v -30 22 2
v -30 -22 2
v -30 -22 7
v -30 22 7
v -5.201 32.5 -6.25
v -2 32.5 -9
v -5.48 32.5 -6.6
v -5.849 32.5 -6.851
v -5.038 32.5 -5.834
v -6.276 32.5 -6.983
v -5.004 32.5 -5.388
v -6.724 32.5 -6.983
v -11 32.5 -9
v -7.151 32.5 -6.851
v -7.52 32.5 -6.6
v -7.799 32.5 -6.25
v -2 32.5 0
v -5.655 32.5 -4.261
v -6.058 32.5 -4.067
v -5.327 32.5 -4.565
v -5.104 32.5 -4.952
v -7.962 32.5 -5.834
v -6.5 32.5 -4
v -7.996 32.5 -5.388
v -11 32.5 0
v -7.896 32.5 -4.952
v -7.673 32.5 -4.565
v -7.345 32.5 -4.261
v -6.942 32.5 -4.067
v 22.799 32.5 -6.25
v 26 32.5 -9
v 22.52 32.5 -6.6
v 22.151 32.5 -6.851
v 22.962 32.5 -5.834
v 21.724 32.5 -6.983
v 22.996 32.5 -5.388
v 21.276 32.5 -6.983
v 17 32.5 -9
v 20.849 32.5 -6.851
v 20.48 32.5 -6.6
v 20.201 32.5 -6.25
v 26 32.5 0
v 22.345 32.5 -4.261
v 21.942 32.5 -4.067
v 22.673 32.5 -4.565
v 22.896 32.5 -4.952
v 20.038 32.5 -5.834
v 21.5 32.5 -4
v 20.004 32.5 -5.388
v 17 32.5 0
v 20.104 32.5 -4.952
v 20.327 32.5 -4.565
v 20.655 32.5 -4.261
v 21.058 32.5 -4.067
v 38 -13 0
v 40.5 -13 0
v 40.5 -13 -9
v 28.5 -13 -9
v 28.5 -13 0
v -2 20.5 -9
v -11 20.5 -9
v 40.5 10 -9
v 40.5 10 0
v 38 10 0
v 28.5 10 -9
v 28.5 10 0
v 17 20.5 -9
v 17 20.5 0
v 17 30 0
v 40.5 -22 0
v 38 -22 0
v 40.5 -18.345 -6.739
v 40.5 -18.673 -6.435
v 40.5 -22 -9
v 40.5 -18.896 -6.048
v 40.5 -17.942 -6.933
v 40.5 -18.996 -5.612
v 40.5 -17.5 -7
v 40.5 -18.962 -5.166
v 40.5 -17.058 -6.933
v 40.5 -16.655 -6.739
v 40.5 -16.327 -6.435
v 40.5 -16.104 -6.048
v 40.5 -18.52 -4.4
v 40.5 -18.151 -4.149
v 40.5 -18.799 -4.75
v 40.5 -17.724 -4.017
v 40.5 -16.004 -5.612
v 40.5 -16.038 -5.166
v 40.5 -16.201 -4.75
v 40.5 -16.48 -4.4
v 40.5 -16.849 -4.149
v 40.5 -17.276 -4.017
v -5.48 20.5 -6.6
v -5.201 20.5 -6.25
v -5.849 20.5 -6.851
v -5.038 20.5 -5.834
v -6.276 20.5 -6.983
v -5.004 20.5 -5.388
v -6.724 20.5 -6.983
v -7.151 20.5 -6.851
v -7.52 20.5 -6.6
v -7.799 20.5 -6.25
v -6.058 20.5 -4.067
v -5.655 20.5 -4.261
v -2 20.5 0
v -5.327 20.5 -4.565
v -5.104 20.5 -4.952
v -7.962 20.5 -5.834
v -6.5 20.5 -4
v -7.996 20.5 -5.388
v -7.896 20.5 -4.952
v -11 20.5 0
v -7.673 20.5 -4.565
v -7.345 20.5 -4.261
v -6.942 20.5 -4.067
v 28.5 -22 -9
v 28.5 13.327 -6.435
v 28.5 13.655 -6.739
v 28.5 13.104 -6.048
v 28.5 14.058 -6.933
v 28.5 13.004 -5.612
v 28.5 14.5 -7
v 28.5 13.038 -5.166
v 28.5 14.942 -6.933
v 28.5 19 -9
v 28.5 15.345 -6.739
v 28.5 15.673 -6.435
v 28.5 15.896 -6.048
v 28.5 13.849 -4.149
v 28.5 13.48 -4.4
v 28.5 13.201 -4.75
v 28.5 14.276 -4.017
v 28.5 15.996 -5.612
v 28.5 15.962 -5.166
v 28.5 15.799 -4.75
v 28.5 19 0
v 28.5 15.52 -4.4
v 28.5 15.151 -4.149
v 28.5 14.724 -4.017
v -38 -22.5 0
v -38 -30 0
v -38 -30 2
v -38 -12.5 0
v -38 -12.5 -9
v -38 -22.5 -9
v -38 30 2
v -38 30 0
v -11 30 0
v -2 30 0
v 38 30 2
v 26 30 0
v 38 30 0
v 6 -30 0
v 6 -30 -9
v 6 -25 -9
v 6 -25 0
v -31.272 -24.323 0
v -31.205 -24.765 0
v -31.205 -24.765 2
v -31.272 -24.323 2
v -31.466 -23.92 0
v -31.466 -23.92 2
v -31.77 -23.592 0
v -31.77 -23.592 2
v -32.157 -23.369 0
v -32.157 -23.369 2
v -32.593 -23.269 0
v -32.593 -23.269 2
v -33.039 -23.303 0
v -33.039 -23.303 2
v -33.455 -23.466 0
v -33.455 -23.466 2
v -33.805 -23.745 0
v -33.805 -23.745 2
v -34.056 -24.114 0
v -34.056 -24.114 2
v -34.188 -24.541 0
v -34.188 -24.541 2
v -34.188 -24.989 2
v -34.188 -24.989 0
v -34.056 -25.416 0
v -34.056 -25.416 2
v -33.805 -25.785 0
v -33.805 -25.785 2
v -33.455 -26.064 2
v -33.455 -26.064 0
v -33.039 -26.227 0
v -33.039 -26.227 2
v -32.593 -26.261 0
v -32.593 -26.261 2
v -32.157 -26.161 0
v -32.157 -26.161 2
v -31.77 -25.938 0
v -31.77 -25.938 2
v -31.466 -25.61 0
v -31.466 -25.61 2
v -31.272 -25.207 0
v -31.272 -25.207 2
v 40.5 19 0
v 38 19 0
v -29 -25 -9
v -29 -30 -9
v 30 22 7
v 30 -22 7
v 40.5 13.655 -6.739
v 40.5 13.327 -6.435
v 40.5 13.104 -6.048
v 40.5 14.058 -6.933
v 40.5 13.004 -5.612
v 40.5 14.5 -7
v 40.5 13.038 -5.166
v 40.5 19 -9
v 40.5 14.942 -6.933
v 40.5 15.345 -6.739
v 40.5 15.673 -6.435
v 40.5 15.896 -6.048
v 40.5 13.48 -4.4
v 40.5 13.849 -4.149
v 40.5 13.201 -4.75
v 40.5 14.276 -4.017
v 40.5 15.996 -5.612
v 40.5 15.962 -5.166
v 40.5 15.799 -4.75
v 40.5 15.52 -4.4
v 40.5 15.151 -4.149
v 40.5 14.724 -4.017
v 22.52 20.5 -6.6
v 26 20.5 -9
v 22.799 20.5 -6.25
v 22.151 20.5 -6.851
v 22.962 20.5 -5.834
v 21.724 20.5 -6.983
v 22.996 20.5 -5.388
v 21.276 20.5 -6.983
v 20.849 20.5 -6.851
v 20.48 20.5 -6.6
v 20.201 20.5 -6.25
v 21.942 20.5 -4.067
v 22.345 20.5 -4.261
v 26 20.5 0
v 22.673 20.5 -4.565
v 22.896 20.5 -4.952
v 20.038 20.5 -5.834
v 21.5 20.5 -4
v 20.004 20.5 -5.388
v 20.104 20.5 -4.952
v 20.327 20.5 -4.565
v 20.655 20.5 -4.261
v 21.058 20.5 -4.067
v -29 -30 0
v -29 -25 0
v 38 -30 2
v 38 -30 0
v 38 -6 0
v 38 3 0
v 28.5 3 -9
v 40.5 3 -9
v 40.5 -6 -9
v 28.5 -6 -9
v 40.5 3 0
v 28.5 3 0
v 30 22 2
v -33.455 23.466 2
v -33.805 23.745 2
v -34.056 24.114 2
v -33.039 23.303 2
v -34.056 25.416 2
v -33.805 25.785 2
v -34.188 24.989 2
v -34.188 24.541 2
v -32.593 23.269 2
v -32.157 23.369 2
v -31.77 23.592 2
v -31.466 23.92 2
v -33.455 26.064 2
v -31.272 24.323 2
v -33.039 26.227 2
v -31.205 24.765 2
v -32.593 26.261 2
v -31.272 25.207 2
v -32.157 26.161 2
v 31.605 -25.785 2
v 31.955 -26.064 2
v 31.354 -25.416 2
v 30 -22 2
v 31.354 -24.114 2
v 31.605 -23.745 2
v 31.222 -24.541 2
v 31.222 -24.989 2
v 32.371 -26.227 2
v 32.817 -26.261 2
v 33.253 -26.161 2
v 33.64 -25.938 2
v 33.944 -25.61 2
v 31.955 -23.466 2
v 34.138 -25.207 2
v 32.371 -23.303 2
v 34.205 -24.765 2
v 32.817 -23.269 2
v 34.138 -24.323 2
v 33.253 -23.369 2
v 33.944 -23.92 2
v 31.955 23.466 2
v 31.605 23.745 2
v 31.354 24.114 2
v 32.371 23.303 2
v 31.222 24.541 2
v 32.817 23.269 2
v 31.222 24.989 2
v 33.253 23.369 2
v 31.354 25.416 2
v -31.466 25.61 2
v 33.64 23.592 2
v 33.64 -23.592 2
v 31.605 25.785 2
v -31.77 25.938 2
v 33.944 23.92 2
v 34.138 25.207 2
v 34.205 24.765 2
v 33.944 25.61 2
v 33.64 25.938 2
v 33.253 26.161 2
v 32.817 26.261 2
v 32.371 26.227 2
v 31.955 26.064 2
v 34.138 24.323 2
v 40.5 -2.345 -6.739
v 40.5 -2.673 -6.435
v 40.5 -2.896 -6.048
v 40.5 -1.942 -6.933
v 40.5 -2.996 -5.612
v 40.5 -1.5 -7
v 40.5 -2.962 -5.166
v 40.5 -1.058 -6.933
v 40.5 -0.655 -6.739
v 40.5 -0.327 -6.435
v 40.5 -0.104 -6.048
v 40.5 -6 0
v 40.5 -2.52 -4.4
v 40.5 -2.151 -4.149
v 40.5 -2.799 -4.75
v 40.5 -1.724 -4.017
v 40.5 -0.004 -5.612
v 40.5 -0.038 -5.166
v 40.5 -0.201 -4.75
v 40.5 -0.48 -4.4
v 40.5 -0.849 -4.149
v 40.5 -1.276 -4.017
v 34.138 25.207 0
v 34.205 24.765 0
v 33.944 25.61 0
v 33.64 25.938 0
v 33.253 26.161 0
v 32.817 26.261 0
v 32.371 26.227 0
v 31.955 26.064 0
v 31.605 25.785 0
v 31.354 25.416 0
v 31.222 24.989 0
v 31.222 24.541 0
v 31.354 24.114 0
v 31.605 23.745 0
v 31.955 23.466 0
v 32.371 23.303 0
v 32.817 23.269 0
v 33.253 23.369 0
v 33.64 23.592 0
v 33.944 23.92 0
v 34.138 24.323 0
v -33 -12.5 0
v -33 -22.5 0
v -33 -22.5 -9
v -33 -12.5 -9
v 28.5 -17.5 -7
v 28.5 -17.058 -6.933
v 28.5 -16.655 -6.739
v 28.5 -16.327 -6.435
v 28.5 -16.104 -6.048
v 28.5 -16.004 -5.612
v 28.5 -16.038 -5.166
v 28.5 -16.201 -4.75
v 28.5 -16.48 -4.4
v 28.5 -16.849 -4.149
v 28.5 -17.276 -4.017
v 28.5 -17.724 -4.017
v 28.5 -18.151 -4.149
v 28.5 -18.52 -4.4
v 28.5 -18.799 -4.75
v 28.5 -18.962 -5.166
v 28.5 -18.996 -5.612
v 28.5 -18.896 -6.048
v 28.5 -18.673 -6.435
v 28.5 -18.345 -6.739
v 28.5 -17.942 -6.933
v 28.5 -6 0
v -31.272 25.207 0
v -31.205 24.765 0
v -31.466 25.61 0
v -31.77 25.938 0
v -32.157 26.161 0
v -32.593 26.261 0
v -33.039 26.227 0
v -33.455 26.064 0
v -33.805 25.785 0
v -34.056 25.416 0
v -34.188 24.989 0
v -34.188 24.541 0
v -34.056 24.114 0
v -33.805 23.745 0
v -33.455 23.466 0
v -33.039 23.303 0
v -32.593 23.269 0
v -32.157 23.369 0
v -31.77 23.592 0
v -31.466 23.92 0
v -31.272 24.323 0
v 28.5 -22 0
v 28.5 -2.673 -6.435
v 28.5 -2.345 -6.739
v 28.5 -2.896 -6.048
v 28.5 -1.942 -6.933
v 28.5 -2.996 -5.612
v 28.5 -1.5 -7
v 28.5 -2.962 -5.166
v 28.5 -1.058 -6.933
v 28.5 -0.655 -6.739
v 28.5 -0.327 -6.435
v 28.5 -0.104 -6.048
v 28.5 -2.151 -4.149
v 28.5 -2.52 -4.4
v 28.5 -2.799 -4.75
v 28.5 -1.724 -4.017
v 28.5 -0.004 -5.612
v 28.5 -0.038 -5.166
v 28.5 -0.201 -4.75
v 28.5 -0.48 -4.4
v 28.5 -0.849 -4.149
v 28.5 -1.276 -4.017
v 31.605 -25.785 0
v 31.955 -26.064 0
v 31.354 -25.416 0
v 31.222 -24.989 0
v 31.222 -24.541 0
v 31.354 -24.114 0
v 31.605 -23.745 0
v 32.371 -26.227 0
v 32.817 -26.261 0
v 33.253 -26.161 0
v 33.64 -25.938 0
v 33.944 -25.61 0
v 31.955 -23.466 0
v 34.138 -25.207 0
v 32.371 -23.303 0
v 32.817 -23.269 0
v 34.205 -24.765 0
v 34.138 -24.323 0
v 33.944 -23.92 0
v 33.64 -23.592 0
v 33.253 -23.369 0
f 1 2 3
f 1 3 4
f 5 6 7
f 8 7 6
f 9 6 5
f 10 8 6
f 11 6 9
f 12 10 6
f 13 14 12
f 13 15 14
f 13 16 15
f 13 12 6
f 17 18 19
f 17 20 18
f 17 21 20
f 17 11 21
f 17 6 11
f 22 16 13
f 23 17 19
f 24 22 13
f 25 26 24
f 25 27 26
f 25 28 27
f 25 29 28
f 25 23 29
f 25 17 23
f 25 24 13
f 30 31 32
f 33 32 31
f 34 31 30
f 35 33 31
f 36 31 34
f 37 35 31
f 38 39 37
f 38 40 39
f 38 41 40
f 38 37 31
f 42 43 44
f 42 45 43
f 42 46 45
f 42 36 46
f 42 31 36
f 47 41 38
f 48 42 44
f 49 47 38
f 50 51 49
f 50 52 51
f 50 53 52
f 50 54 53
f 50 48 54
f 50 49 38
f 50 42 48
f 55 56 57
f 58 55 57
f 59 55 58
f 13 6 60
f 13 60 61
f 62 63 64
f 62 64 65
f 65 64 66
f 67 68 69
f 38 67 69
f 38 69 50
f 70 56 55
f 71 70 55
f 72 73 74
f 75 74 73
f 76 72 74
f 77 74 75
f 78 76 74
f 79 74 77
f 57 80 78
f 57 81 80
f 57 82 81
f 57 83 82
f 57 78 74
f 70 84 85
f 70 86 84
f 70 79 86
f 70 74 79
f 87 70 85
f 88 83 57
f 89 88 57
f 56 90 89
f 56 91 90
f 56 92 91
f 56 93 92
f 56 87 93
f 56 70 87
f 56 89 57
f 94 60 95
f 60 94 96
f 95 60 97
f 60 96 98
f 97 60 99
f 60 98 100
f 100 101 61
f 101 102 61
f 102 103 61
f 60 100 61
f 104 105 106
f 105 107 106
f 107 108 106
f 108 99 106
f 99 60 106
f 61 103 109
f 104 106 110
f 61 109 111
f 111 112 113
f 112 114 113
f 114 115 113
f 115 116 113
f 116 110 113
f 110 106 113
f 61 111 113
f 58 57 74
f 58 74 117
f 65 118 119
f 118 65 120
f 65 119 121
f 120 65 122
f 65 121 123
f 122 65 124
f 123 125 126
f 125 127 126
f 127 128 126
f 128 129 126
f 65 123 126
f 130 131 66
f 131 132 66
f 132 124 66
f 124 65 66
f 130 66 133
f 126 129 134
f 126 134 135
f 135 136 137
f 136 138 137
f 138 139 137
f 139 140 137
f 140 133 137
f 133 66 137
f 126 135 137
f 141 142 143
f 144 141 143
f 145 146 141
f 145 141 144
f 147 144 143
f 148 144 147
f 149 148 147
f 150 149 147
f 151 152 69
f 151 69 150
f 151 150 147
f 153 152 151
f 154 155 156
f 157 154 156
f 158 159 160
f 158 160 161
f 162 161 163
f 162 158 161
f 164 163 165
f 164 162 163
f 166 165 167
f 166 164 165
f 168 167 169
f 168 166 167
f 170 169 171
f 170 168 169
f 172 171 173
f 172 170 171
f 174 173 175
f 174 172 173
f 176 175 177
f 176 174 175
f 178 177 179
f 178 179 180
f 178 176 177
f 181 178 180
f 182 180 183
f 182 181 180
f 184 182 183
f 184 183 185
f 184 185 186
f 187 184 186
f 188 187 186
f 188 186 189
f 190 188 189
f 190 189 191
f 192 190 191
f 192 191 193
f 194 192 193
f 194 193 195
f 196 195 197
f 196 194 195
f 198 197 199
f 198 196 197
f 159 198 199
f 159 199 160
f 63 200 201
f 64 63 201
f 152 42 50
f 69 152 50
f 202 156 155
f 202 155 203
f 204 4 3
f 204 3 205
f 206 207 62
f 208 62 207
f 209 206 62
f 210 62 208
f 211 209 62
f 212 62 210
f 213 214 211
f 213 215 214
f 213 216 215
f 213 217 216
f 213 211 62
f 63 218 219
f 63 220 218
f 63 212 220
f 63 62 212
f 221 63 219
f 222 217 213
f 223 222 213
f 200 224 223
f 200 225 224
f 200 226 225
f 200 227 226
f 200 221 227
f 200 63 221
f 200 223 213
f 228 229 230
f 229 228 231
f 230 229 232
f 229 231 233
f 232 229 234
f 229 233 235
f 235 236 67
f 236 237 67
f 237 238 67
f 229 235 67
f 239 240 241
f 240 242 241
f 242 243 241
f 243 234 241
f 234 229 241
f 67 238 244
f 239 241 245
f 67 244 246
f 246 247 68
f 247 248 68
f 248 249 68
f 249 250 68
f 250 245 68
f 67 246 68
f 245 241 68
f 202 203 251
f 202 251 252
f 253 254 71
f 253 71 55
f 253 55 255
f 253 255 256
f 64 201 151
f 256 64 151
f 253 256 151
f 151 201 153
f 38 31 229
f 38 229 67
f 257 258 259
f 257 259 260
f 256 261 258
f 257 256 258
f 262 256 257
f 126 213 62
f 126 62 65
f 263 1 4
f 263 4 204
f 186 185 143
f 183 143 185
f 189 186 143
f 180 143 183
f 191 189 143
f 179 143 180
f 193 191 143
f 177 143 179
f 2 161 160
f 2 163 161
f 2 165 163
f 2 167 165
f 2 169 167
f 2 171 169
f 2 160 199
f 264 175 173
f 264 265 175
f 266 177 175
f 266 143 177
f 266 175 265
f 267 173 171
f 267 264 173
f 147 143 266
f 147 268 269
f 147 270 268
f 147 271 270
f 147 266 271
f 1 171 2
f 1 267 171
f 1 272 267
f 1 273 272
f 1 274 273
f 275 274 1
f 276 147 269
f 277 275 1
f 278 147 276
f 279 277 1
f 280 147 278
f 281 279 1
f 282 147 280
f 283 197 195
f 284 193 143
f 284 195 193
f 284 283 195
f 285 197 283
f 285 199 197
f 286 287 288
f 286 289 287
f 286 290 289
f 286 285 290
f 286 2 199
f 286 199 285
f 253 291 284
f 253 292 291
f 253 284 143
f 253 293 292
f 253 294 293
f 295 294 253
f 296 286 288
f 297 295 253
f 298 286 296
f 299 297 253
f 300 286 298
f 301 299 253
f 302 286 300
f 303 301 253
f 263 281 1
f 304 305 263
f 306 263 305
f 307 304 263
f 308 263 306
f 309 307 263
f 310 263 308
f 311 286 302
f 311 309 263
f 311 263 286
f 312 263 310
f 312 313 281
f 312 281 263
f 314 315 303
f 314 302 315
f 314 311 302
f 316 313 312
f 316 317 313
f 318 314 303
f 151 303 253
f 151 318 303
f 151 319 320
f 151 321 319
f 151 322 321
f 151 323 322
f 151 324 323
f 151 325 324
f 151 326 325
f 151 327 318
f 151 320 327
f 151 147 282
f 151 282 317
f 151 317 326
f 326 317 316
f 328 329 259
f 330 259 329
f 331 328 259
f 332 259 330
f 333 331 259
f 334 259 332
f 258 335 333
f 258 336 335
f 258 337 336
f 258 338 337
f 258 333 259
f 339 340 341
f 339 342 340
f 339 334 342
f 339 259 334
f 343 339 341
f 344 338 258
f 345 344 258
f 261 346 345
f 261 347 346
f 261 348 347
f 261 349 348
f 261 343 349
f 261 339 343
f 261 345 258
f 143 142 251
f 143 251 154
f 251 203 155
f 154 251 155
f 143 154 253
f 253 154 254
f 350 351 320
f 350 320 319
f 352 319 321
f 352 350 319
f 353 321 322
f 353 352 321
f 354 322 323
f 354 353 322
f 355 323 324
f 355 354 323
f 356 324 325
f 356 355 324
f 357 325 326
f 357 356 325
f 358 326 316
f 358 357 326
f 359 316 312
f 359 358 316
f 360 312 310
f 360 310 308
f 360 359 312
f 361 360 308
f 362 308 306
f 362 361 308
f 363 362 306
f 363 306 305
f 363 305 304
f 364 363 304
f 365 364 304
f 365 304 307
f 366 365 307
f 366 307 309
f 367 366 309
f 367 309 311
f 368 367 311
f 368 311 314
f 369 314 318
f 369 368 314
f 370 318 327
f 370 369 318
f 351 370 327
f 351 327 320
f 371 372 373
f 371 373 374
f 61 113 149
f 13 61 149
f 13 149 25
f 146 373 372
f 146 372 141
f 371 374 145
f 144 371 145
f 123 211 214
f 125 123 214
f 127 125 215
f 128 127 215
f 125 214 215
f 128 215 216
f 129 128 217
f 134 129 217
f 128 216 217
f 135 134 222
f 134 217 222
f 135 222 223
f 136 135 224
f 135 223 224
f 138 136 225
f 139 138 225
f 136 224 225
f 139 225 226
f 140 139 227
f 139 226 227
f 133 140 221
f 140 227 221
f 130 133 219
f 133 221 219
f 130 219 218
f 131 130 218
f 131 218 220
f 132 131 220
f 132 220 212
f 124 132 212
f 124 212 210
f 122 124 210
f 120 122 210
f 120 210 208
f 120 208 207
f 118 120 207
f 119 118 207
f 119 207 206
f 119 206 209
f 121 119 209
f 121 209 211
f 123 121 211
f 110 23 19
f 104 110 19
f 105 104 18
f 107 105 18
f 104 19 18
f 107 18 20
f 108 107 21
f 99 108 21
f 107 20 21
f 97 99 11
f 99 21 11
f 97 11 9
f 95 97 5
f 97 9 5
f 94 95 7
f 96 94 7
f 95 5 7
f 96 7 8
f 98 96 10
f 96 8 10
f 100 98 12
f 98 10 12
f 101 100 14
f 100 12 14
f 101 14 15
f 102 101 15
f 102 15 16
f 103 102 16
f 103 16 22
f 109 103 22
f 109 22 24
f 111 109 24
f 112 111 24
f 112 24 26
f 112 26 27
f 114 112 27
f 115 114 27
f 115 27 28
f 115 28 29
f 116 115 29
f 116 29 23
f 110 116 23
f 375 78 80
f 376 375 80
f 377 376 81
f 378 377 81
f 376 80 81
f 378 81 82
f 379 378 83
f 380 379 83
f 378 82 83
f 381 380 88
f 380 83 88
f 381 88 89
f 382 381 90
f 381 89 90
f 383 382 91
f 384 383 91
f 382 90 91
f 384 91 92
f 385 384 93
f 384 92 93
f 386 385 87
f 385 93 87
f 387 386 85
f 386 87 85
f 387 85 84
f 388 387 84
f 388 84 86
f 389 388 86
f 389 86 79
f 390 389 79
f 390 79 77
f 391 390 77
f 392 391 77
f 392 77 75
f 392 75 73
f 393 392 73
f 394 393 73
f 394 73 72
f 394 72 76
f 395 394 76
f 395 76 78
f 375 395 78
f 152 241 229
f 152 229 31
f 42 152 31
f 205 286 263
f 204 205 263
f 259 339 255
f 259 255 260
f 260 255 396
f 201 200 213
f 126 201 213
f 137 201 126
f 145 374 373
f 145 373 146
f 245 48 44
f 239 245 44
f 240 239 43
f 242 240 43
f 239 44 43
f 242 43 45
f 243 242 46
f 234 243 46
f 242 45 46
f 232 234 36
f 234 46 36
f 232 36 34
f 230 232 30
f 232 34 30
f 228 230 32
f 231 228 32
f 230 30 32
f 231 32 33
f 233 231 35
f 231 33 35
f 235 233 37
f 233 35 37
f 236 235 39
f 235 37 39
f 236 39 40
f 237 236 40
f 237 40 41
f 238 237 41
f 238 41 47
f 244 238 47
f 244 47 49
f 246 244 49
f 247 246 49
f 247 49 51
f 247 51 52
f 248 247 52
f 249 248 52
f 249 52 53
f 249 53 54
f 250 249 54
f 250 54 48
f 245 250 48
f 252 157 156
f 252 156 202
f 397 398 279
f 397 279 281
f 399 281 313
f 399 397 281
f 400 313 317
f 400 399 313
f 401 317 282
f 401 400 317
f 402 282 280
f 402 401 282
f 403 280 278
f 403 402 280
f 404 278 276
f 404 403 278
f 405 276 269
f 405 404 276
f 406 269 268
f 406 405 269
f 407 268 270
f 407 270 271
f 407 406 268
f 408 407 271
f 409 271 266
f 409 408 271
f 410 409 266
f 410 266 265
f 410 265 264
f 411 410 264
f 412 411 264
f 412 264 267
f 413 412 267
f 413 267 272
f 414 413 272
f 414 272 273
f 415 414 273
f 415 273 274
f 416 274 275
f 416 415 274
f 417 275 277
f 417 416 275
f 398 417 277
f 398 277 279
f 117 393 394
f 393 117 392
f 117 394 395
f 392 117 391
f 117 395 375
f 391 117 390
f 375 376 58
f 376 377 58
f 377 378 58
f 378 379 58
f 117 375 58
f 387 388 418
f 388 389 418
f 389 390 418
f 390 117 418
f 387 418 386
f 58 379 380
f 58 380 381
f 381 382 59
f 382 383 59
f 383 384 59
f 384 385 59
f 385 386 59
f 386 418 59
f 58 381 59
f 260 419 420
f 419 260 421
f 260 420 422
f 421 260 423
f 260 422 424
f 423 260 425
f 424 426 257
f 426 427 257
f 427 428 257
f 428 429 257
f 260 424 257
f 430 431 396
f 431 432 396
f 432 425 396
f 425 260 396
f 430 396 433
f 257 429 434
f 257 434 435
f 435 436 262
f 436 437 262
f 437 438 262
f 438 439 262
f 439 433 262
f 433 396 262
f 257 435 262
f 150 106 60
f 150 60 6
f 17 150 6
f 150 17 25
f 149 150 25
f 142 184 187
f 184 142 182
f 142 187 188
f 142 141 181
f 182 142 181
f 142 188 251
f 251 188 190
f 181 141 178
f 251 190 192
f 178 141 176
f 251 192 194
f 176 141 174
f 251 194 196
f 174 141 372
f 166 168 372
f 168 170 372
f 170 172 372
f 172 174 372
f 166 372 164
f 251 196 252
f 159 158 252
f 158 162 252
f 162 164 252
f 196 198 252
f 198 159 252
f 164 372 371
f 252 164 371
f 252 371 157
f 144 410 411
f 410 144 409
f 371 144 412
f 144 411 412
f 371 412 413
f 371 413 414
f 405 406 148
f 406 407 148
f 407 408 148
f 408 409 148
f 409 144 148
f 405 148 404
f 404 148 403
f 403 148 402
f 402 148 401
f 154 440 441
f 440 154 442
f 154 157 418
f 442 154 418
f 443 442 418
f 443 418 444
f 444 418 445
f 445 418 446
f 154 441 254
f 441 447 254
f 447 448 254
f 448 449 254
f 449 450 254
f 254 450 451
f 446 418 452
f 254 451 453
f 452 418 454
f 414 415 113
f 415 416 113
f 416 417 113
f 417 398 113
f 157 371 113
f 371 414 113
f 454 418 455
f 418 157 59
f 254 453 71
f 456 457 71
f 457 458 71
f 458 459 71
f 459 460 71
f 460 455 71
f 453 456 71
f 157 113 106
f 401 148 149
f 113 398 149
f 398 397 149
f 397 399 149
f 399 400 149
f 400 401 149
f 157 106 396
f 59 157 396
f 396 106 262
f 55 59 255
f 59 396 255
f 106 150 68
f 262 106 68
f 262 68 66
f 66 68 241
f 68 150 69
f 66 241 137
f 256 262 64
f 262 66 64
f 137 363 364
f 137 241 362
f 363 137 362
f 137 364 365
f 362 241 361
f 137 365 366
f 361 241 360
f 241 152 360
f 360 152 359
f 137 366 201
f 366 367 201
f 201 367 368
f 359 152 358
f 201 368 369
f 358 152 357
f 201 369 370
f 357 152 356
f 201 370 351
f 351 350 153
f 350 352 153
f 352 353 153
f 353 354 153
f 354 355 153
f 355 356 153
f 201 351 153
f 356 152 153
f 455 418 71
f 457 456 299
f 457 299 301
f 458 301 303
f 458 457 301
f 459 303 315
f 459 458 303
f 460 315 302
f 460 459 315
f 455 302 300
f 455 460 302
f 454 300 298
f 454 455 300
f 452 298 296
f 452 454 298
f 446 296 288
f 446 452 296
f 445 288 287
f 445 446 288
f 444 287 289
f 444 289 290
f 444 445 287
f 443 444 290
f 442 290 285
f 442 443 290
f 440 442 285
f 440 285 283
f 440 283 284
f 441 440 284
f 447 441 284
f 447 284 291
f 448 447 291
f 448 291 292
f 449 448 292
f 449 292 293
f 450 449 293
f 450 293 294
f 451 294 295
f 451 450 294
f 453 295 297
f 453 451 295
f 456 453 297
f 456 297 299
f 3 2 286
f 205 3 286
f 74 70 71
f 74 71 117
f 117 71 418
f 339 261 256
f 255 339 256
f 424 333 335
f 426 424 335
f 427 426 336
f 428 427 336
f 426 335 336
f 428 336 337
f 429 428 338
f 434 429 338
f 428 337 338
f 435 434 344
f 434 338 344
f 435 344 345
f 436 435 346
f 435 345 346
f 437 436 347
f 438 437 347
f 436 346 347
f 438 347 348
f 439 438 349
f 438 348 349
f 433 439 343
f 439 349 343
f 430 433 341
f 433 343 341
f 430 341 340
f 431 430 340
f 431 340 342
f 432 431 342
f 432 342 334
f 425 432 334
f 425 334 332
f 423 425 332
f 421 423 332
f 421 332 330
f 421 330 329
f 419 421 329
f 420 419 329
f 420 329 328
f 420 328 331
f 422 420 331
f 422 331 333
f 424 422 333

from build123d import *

# Parameters (mm, degrees)
SKETCH_1_W          = 76
SKETCH_1_H          = 60
SKETCH_1_R          = 1.5
EXTRUDE_1_DEPTH     = 2
SKETCH_2_W          = 60
SKETCH_2_H          = 44
EXTRUDE_2_DEPTH     = 5
SKETCH_3_W          = 12
SKETCH_3_H          = 9
SKETCH_3_W_2        = 9
SKETCH_3_H_2        = 12
SKETCH_3_W_3        = 35
SKETCH_3_H_3        = 5
SKETCH_3_W_4        = 5
SKETCH_3_H_4        = 10
EXTRUDE_3_DEPTH     = 9
SKETCH_4_R          = 1.5
CUT_EXTRUDE_1_DEPTH = 26
SKETCH_5_R          = 1.5
CUT_EXTRUDE_2_DEPTH = 26


with BuildPart() as part:
    # 草图1 → 凸台-拉伸1 (new body)
    with BuildSketch(Plane.XY):
        Rectangle(SKETCH_1_W, SKETCH_1_H)
        with Locations((-32.705, 24.765)):
            Circle(SKETCH_1_R, mode=Mode.SUBTRACT)
        with Locations((32.705, 24.765)):
            Circle(SKETCH_1_R, mode=Mode.SUBTRACT)
        with Locations((-32.705, -24.765)):
            Circle(SKETCH_1_R, mode=Mode.SUBTRACT)
        with Locations((32.705, -24.765)):
            Circle(SKETCH_1_R, mode=Mode.SUBTRACT)
    extrude(amount=EXTRUDE_1_DEPTH)

    # 草图2 → 凸台-拉伸2 (add)
    with BuildSketch(Plane.XY.offset(2)):
        Rectangle(SKETCH_2_W, SKETCH_2_H)
    extrude(amount=EXTRUDE_2_DEPTH)

    # 草图3 → 凸台-拉伸3 (add)
    with BuildSketch(Plane(origin=(0, 0, 0), x_dir=(-1, 0, 0), z_dir=(0, 0, -1))):
        with Locations((-34.5, -17.5)):
            Rectangle(SKETCH_3_W, SKETCH_3_H)
        with Locations((-34.5, -1.5)):
            Rectangle(SKETCH_3_W, SKETCH_3_H)
        with Locations((-34.5, 14.5)):
            Rectangle(SKETCH_3_W, SKETCH_3_H)
        with Locations((-21.5, 26.5)):
            Rectangle(SKETCH_3_W_2, SKETCH_3_H_2)
        with Locations((6.5, 26.5)):
            Rectangle(SKETCH_3_W_2, SKETCH_3_H_2)
        with Locations((11.5, -27.5)):
            Rectangle(SKETCH_3_W_3, SKETCH_3_H_3)
        with Locations((35.5, -17.5)):
            Rectangle(SKETCH_3_W_4, SKETCH_3_H_4)
    extrude(amount=EXTRUDE_3_DEPTH)

    # 草图4 → 切除-拉伸1 (cut)
    with BuildSketch(Plane(origin=(40.5, 0, 0), x_dir=(0, 0, -1), z_dir=(1, 0, 0))):
        with Locations((5.5, -17.5)):
            Circle(SKETCH_4_R)
        with Locations((5.5, -1.5)):
            Circle(SKETCH_4_R)
        with Locations((5.5, 14.5)):
            Circle(SKETCH_4_R)
    extrude(amount=-CUT_EXTRUDE_1_DEPTH, mode=Mode.SUBTRACT)

    # 草图5 → 切除-拉伸2 (cut)
    with BuildSketch(Plane(origin=(0, 32.5, 0), x_dir=(1, 0, 0), z_dir=(0, 1, 0))):
        with Locations(Location((21.5, 5.5, 0), (0, 0, 270))):
            Circle(SKETCH_5_R)
        with Locations(Location((-6.5, 5.5, 0), (0, 0, 270))):
            Circle(SKETCH_5_R)
    extrude(amount=-CUT_EXTRUDE_2_DEPTH, mode=Mode.SUBTRACT)


solid = part.part
